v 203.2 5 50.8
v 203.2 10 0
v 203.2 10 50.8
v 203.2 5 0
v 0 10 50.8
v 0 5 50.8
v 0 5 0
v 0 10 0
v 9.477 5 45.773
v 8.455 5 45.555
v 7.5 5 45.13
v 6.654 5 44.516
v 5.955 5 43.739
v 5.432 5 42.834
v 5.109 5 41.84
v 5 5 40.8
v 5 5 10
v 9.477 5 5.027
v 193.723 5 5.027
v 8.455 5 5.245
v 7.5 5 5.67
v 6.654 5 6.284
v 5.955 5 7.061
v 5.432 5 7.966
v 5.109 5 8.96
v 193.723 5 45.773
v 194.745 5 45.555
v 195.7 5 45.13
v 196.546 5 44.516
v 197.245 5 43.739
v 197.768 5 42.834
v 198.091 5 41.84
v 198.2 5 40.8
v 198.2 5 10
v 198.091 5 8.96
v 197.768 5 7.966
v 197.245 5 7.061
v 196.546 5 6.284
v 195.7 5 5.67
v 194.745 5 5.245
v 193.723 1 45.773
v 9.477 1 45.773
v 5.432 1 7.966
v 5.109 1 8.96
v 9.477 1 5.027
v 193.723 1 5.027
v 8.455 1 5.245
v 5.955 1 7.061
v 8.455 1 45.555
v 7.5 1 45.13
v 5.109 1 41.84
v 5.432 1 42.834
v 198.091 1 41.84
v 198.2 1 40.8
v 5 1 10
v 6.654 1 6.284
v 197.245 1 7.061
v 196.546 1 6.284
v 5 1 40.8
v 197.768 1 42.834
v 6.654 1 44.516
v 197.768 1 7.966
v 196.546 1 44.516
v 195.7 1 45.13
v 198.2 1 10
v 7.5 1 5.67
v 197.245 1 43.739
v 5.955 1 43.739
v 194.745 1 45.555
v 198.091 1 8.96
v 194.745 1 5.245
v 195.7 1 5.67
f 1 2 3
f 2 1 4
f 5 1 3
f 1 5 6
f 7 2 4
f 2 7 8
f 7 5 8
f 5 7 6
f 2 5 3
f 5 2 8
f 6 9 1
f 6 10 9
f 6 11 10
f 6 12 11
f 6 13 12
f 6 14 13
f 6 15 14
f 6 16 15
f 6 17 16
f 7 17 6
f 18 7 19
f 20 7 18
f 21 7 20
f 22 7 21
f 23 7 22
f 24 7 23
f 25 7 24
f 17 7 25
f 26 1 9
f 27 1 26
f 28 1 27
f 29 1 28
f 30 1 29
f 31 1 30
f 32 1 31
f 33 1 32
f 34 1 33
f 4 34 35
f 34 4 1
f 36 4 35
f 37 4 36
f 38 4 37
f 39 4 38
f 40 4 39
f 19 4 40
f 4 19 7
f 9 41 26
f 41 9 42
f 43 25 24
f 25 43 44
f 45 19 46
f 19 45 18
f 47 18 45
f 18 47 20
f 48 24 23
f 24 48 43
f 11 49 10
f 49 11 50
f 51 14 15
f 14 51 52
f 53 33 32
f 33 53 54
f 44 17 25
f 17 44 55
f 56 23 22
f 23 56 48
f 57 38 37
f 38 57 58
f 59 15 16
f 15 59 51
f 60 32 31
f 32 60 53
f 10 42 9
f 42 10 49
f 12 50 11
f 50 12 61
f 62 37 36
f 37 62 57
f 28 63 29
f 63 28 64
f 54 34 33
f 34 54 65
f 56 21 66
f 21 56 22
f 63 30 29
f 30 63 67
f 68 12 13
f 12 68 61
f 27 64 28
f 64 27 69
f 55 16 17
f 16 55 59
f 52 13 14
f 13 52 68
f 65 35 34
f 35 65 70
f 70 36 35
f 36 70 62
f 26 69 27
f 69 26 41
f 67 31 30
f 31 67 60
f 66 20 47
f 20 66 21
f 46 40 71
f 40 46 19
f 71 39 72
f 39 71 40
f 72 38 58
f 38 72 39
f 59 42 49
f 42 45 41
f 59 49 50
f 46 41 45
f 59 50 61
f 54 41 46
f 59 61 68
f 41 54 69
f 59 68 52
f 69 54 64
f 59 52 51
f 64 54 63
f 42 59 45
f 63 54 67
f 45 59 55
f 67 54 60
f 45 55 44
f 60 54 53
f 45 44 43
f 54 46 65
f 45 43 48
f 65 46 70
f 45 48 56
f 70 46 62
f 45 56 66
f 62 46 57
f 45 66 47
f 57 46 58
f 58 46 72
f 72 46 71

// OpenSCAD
// file: ../lib/neo_pixel.scad
///< Alitovo Neo pixel RGB X000UCVKBH 2812b-1-LED-WH
use <../lib/math.scad>;
use <../lib/utils.scad>;

///< Parameters - Begin
led_assembly_h = 2.8;
led_assembly_d = 9.6;

///< Diameter of the PCB 
pcb_d = 9.6;
pcb_h = 1.2;

///< Demensions of the LED IC
led_w = 5;
led_d = led_w;
led_h = led_assembly_h - pcb_h;


///< Modules
module pcb(h = pcb_h, d = pcb_d){
     ///< LED PCB definition
     ///< The h/d parameters are passed in to
     ///< allow for socketing of the LEDs.
     color( rand_clr() )cylinder( h=h, d=d, $fn = 30 );
}

module led(){
     ///< Neo pixel LED (2812b-1)
     union(){
         color( rand_clr() )cube( [ led_w, led_d, led_h ] );
         color( rand_clr() )
              translate([led_w/2,led_d/2, 0] )
              cylinder( h=led_h, d= led_w, $fn = 30 );
         }
}

module neo_pixel(h=pcb_h, d=pcb_d){
     ///< Assembly of the led and pcb_pad
     union(){
          translate([-led_w/2,-led_d/2,pcb_h-0.01])led();
          pcb(h=h, d=d);
          }

}

///< Build object
///< Remove this when including
//neo_pixel();
// file: ../lib/hull.scad
/*
hull.scad - a library that leverages the hull() procedure
Author: Elliot Williams
github: https://gist.github.com/hexagon5un )
source: https://gist.github.com/hexagon5un/73e187dfa0404c69177795424f397ce6#file-hull-scad

Featured in the hackaday atricle: 'OPENSCAD: TIEING IT TOGETHER WITH HULL()'
https://hackaday.com/2018/02/13/openscad-tieing-it-together-with-hull/
*/
module multiHull(){
	for (i = [1 : $children-1])
		hull(){
			children(0);
			children(i);
		}
}

module sequentialHull(){
	for (i = [0: $children-2])
		hull(){
			children(i);
			children(i+1);
		}
}

/* Extended fun hull functions */ 

module cylinders(points, diameter, thickness){
	for (p=points){
		translate(p) cylinder(d=diameter, h=thickness, center=true);
	}
}

module plate(points, diameter, thickness, hole_diameter){
	difference(){
		hull() cylinders(points, diameter, thickness);
		cylinders(points, hole_diameter, 1000);
	}
}

module bar(length, width, thickness, hole_diameter){
	plate([[0,0,0], [length,0,0]], width, thickness, hole_diameter);
}

module rounded_box(points, radius, height, facets=30){
	hull(){
		for (p = points){
			translate(p)
				cylinder(r=radius, h=height, $fn=facets);
		}
	}
}

module point_cloud(points, radius=1, facets=8){
	for (p=points){
		translate(p)
			sphere(radius/cos(180/facets), $fn=facets);
		// polygon sphere circumscribed on radius
	}
}

module point_hull(points, radius=1, facets=8){
	hull(){
		point_cloud(points, radius, facets);
	}
}

// Shrink the exterior of the points so that the hull fits inside
function select(vector, i) = [ for (p=vector) p[i] ];
function axis_center(v, i) = (max(select(v, i)) - min(select(v,i)))/2;
function center(v) = [ for (i = [0,1,2]) axis_center(v, i) ];
function shrink_point(point, center, radius) = [ for (i = [0,1,2]) point[i] > center[i] ? point[i] - radius : point[i] + radius ]; 
function shrink(points, radius) = [ for (p = points) shrink_point(p, center(points), radius) ];

module interior_point_hull(points, radius=1){
	point_hull(shrink(points, radius), radius);
}

module interior_rounded_box(points, radius, height){
	rounded_box(shrink(points, radius), radius, height);
}


module mirror_copy(v = [1, 0, 0]) {
    children();
    mirror(v) children();
}
// file: led_frame.scad
///< LED frame for the neo pixel array
use <../lib/math.scad>;
use <../lib/utils.scad>;
include <../lib/neo_pixel.scad>

///< Parameters
frame_w      = 150;
pcb_socket_d = led_assembly_d + 1;
pcb_socket_h = 1.0;
frame_d      = led_assembly_h+pcb_socket_h;//-led_assembly_h*0.04;
frame_h      = pcb_socket_d+1.5;
num_leds     = 10;

///< Modules
module led_frame( width, depth, height ){
     //union(){
     difference(){
          cube( [width, depth, height] );
          led_spacing_w = width/( num_leds );

          ///< Make x number of slots
          for (i = [0:num_leds]){
               offset_spacing = (( i * led_spacing_w ) + ( led_spacing_w ));
               remaining = width - offset_spacing;
               if( remaining >= led_spacing_w ){
                    translate( [ offset_spacing, (pcb_socket_h+0.1), height/2 ] )
                         rotate( [ -90, 0, 0 ])
                         color( rand_clr() )
                         neo_pixel(h=pcb_h+0.1, d=pcb_socket_d);
                    translate( [ offset_spacing, -0.5, height/2 ] )
                        rotate( [ -90, 0, 0 ])
                        color( rand_clr() )
                        cylinder( h=pcb_h+pcb_socket_h, d = pcb_socket_d );

               }
          }
     }
}

///< Build object
echo( "Frame height:", frame_h, "depth:", frame_d, "width:", frame_w );
led_frame( frame_w, frame_d, frame_h );
// file: nameplate.scad
///< Nameplate
/*
https://en.wikipedia.org/wiki/Nameplate
Excerpt:  'Although office nameplates range in size, the most popular nameplate size is 2 by 8 inches (5.08 cm × 20.32 cm)'

*/
use <../lib/math.scad>;
use <../lib/utils.scad>;

///< Parameters
nameplate_w_inches = 8;
nameplate_h_inches = 2;
nameplate_d_inches = 0.10;

nameplate_w = in2mm( nameplate_w_inches );
nameplate_h = in2mm( nameplate_h_inches );
nameplate_d = in2mm( nameplate_d_inches );

nameplate_debug = false;

if( nameplate_debug ) {
     echo( "Nameplate width: ",  nameplate_w,  "mm" );
     echo( "Nameplate height: ", nameplate_h, "mm" );
     echo( "Nameplate depth: ",  nameplate_d,  "mm" );
}

nameplate = [ nameplate_w, nameplate_d, nameplate_h ];

///< Modules
module Nameplate( size, center = false ) {
     cube( size, center = center );
}
// file: frame.scad
///< Object definition
use <../lib/math.scad>;
use <../lib/utils.scad>;
include <nameplate.scad>

///< Parameters
module Frame( show_nameplate = false ){

     ///< Frame demensions
     frame_clearance = 0.01;
     frame_p = 5 + frame_clearance; //< Padding
     frame_w = nameplate_w + frame_p;
     frame_d = nameplate_d + frame_p;
     frame_h = nameplate_h + frame_p;

     frame = [ frame_w, frame_d, frame_h ];
     frame_inset = [0, frame_p/2, frame_p/2 ];
     frame_view  = [0, 0,         frame_p ];

     nameplate_cut = [ ( frame_w + ( frame_p * 2.0 ) ) * 1.01,
		     nameplate_d * 1.01,
		     nameplate_h * 1.01 ];

     view_w = frame_w;
     view_d = nameplate_d;
     view_h = nameplate_h - ( frame_p);
     view_cut = [ view_w, view_d, view_h ];

     if( show_nameplate ){
	  echo( nameplate );
	  color( rand_clr() )
	       translate( frame_inset ){ Nameplate( nameplate ); }
     }

     ///< Holder
     difference(){
	  color( rand_clr() )cube( frame );
	  color( rand_clr() )
	       translate( frame_inset )
	       Nameplate( nameplate_cut );
	  color( rand_clr() )
	       translate( frame_view )
	       cube( view_cut );
     }
}


///< Build object
//difference(){
     Frame( );
//     translate( [ 190, 0, 0 ] )cube( [30,50,80] );
//}
// file: electronics_box.scad
///< Object definition
use <../lib/math.scad>;
use <../lib/utils.scad>;
include<nameplate.scad>;
use <../lib/hull.scad>;

box_depth = 20;
box_thickness = 5;
lid_thickness = 5;

module electronics_box( depth = 20, thickness = 5 ){
     ///< Component housing
     components_w = nameplate_w;
     components_d = nameplate_d + depth;
     components_h = nameplate_h;
     components_box = [ components_w, components_d, components_h ];
     components_box_cut = [ components_w - thickness,
			    components_d,
			    components_h - thickness ];

     translate( [ 0, nameplate_d, 0 ] )
	  color( rand_clr() )
	  difference(){
	  cube( components_box );
	  translate( [ thickness/2, thickness, thickness/2 ] )
	       cube( components_box_cut );
     }
}

module lid( height = 5, thickness = 5 ){
     ///< Lid
     lid_w = nameplate_w;
     lid_d = height;
     lid_h = nameplate_h;
     lid_tuple = [ lid_w, lid_d, lid_h ];

     inner_points = [
         [ thickness*2,          (thickness*2),      0 ],
         [ thickness*2,          lid_h-(thickness*2),0 ],
         [ lid_w-( thickness*2 ),lid_h-(thickness*2),0 ],
         [ lid_w-( thickness*2 ),(thickness*2),      0 ],
         ];

      translate( [ 0, height, 0 ] ){
          color( rand_clr() )cube( lid_tuple );
          color( rand_clr() )
              rotate( [ 90,0,0] )
              rounded_box( points=inner_points,
                           radius=thickness,
                           height=height - height*0.20 );
      }
}

///< prototype
//electronics_box( depth = box_depth );
//translate( [ 0, box_depth+lid_thickness, 0 ] )lid();
// file: ../lib/utils.scad
///< Utilities

function rand_clr() = rands( 0,1,3 );

///< Length conversions
function in2mm( i ) = ( i * 25.4 ); 
function mm2in( m ) = ( m / 25.4 );

/// This is pulled from stackoverflow
/// https://stackoverflow.com/questions/45826208/openscad-rotating-around-a-particular-point

// rotate as per a, v, but around point pt
module rotate_about_pt(a, v, pt) {
    translate(pt)
        rotate(a,v)
            translate(-pt)
                children();   
}
// file: ../lib/math.scad
///< Math scad module


///< Find the hypotenuse from two sides of a right triangle
function hyp_from_sides( a, b ) = sqrt( pow( a, 2 ) + pow( b, 2 ) );

///< Find equal sides from hypotenuse of a right triangle
function sides_from_hyp(h) = sqrt( pow( h, 2 ) / 2 );

///< Find A from hypotenuse and B
function a_from_hb( h, b ) = sqrt( pow( h, 2 ) - pow( b, 2 ) );

function dist_2d( pt2, pt1 ) = sqrt(pow(( pt2[0]-pt1[0] ),2) + pow(( pt2[1]-pt1[1]),2) );

function mid_pt_2d( pt2, pt1 ) = [( pt1[0]+pt2[0] )/2, ( pt1[1]+pt2[1] )/2, 0 ];
///< Test for math functions

A = 3;
B = 4;
echo("Given A=", A, "and B=", B );
H = hyp_from_sides( A, B );
echo("Hypotenuse=", H );
echo("Calc Correct = ", (H == 5) );

echo("Given H=", H, " which is a hypotenuse with equal sides" );
echo( "the sides=", sides_from_hyp( H ) );

echo("Given H=", H, "B=", 4 );
echo("A=", a_from_hb( H, 4 ) );

echo("Distance from [-1,1] and [3,4] = ", dist_2d( [-1,1],[3,4]) );
// main file
///< Object definition
use <../lib/math.scad>;
use <../lib/utils.scad>;
use <electronics_box.scad>;
use <frame.scad>;
use <nameplate.scad>;
use <led_frame.scad>;

///< Parameters

box_depth = 20;
box_thickness = 5;
lid_thickness = 5;

///< Build object
//electronics_box( depth = box_depth );

lid();
